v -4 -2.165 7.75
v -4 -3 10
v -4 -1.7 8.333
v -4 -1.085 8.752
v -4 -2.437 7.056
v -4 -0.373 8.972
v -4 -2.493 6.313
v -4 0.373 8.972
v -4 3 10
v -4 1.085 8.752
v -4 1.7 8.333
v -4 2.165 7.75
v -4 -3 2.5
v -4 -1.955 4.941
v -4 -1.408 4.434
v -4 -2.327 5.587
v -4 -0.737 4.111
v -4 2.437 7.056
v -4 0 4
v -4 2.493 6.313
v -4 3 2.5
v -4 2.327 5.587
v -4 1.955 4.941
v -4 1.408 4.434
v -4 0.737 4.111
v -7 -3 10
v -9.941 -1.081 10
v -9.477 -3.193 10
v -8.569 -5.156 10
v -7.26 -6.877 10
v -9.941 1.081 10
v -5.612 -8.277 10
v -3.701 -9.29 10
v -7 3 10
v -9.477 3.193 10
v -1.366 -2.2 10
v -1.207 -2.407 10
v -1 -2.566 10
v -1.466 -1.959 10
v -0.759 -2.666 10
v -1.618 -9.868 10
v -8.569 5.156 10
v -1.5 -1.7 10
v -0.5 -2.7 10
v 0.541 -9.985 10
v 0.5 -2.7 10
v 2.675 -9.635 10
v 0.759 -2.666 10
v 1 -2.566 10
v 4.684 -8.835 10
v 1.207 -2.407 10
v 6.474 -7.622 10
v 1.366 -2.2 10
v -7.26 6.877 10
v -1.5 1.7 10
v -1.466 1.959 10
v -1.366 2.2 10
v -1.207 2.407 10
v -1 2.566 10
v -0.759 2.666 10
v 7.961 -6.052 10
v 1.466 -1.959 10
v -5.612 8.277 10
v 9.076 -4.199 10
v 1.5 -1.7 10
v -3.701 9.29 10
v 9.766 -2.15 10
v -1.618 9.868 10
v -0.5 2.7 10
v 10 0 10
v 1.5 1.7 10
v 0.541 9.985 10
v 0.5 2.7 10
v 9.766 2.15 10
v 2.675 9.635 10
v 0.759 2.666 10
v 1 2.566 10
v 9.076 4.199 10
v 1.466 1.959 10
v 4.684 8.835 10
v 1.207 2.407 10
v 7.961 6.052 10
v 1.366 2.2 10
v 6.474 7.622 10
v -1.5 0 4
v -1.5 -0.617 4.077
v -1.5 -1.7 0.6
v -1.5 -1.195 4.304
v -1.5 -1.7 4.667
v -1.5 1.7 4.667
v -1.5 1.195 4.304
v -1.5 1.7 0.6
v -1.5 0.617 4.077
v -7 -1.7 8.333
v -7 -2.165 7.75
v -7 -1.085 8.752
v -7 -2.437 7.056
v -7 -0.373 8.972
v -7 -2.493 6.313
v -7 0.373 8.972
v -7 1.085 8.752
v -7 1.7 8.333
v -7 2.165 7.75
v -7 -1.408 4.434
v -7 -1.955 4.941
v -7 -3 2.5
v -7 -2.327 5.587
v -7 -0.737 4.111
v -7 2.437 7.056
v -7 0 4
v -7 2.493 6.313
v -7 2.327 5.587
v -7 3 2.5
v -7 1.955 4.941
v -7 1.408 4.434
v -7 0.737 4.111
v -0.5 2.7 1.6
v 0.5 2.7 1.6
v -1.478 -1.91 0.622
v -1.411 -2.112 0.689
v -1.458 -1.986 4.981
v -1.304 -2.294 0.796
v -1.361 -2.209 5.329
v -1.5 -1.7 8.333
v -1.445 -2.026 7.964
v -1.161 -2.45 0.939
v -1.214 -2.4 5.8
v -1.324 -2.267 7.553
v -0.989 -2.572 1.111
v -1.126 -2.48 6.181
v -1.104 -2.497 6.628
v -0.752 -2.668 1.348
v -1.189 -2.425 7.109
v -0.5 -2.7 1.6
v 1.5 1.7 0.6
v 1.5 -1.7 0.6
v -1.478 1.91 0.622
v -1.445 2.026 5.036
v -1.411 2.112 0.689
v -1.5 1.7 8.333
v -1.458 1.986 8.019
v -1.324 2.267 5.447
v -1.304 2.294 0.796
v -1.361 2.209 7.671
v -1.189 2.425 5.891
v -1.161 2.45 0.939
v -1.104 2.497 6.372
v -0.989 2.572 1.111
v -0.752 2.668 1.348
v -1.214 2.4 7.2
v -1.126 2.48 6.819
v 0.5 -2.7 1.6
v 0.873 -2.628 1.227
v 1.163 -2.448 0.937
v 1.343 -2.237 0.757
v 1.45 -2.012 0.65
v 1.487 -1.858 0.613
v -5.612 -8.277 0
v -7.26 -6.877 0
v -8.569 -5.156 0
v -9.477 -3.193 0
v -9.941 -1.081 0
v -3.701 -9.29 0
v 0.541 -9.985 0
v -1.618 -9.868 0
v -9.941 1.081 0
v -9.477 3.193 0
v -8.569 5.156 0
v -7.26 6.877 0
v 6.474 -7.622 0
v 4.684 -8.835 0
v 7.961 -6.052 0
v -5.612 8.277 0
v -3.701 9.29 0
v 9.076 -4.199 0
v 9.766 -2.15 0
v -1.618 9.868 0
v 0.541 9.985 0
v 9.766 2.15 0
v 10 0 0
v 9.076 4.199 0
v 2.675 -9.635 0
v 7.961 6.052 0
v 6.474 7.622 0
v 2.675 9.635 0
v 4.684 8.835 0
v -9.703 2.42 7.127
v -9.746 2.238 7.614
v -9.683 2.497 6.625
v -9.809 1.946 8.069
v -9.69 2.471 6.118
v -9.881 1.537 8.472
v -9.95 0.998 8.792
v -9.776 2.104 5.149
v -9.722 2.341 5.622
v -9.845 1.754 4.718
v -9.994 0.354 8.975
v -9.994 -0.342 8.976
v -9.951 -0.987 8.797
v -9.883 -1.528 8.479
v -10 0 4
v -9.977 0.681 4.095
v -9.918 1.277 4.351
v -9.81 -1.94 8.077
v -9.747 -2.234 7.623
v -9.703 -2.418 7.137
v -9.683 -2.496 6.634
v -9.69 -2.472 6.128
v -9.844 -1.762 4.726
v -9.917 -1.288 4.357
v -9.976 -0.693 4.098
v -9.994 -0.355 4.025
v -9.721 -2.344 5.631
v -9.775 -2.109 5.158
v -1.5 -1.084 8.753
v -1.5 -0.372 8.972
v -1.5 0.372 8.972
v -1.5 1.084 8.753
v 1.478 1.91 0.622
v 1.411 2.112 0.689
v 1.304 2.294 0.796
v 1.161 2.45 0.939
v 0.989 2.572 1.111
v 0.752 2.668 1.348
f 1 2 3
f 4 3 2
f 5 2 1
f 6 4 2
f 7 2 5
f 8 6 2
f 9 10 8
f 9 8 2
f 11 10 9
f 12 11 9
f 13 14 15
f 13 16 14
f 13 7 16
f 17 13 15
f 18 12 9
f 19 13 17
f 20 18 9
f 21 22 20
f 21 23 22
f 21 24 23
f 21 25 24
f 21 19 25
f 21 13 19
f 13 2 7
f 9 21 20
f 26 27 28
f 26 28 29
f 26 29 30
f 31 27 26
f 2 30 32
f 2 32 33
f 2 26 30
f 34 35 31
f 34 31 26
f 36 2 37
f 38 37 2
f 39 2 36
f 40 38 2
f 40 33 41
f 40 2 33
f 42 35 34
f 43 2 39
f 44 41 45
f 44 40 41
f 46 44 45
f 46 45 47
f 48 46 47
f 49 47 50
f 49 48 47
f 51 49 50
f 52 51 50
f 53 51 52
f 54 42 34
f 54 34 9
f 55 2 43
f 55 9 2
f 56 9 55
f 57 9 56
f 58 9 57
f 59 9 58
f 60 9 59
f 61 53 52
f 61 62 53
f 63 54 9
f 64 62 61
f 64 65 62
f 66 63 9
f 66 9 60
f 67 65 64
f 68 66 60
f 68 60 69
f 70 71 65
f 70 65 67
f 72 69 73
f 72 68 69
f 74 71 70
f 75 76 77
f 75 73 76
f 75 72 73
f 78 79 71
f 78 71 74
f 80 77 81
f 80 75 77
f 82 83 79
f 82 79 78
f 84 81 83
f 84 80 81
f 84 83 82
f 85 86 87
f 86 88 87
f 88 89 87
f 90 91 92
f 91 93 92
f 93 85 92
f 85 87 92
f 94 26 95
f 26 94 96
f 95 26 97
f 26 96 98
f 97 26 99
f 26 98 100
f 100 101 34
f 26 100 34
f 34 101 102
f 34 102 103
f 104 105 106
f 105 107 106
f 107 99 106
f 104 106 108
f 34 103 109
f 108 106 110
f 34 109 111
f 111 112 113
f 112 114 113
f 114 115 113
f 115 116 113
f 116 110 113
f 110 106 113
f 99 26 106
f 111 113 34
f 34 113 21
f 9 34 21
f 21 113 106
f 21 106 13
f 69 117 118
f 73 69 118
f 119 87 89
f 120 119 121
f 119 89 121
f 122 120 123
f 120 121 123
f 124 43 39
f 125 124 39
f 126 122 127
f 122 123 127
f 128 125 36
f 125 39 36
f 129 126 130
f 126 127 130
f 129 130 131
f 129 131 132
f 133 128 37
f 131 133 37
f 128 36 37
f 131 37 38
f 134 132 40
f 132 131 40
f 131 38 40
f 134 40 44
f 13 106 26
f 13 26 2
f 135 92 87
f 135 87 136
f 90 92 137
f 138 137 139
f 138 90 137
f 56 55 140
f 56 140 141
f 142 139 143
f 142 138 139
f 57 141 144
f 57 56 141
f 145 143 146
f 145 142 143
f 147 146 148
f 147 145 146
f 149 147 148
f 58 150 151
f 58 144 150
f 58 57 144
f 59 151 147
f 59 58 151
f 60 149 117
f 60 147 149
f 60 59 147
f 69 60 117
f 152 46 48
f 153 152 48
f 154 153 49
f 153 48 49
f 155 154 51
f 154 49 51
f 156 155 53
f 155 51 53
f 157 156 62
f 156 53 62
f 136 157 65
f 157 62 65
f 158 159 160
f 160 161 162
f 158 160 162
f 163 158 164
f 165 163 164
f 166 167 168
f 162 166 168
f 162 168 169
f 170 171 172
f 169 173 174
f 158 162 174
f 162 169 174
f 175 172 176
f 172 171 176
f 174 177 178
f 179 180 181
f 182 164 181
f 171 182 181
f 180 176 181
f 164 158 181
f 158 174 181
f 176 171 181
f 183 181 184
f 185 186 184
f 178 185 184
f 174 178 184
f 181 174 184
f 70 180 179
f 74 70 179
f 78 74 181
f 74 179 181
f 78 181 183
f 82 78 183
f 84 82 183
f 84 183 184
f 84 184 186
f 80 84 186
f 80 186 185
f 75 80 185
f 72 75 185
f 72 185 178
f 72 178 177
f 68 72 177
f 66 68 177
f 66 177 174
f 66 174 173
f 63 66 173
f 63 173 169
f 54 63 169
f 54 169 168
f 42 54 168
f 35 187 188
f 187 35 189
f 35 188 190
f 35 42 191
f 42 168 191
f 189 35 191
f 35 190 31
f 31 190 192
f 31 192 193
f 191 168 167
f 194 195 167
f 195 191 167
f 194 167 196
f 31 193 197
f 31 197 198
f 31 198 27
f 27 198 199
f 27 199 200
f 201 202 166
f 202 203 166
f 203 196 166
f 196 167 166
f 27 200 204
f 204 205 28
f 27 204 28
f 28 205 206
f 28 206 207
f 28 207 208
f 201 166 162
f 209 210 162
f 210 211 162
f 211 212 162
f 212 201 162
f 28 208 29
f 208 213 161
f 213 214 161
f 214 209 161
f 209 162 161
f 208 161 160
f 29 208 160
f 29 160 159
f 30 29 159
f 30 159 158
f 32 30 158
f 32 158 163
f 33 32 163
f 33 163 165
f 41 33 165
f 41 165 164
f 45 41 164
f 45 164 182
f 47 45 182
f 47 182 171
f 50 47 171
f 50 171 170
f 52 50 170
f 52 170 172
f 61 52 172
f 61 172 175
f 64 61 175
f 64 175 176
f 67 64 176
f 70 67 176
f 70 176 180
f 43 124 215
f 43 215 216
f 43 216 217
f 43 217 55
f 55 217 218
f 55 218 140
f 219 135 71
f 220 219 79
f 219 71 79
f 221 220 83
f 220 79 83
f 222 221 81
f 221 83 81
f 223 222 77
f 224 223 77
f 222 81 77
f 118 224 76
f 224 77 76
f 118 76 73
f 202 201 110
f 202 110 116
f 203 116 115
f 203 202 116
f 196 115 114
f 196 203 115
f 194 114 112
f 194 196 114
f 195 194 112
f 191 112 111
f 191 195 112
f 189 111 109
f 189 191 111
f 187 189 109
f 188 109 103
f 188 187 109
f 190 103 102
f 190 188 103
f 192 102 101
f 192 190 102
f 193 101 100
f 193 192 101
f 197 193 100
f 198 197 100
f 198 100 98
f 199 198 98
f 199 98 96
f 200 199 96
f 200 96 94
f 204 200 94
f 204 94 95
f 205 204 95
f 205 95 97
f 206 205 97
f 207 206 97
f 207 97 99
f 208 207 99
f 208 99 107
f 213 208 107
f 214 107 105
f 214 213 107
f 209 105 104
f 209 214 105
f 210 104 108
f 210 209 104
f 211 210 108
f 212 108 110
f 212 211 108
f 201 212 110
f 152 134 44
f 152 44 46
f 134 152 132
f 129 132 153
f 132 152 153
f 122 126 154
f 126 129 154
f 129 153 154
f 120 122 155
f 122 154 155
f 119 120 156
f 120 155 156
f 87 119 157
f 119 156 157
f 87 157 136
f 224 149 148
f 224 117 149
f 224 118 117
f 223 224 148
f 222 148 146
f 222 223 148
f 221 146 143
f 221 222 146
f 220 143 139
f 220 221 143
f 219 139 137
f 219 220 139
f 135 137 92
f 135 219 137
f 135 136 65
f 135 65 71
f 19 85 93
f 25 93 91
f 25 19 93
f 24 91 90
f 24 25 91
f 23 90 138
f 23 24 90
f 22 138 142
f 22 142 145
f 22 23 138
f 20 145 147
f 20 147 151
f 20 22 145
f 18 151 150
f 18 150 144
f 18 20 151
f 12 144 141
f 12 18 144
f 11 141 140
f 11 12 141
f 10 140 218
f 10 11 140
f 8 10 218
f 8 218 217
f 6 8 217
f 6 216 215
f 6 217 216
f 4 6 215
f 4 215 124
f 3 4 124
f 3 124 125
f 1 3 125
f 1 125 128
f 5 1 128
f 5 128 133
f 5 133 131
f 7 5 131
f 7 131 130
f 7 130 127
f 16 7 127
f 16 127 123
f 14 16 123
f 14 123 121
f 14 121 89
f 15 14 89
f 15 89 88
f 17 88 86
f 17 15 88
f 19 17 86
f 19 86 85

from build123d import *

# Parameters (mm, degrees)
CYLINDER001_R     = 2.5
CYLINDER001_DEPTH = 15
BOX_W             = 3
BOX_H             = 5.4
BOX_DEPTH         = 15
FILLET_R          = 1
BOX001_W          = 3
BOX001_H          = 6
BOX001_DEPTH      = 15
CYLINDER_R        = 10
CYLINDER_DEPTH    = 10


with BuildPart() as cilindro001:
    # Cylinder001 → Cylinder001 (new body)
    with BuildSketch(Plane(origin=(-15, 0, 6.5), x_dir=(0, 0, -1), z_dir=(1, 0, 0))):
        Circle(CYLINDER001_R)
    extrude(amount=CYLINDER001_DEPTH)


with BuildPart() as fillet_body:
    # Box → Box (new body)
    with BuildSketch(Plane(origin=(-1.5, -2.7, 0.6), x_dir=(1, 0, 0), z_dir=(0, 0, 1))):
        with Locations((1.5, 2.7)):
            Rectangle(BOX_W, BOX_H)
    extrude(amount=BOX_DEPTH)

    # Fillet
    fillet_edges = [fillet_body.edges().sort_by_distance(p)[0] for p in [
        (-1.5, -2.7, 8.1),
        (-1.5, 2.7, 8.1),
        (1.5, -2.7, 8.1),
        (1.5, 2.7, 8.1),
        (0, -2.7, 0.6),
        (0, -2.7, 15.6),
        (0, 2.7, 0.6),
        (0, 2.7, 15.6),
    ]]
    fillet(fillet_edges, radius=FILLET_R)


with BuildPart() as cubo001:
    # Box001 → Box001 (new body)
    with BuildSketch(Plane(origin=(-7, -3, 2.5), x_dir=(1, 0, 0), z_dir=(0, 0, 1))):
        with Locations((1.5, 3)):
            Rectangle(BOX001_W, BOX001_H)
    extrude(amount=BOX001_DEPTH)


with BuildPart() as cut002:
    # Cylinder → Cylinder (new body)
    with BuildSketch(Plane.XY):
        Circle(CYLINDER_R)
    extrude(amount=CYLINDER_DEPTH)

    # Cut: cut Cubo001
    add(cubo001.part, mode=Mode.SUBTRACT)

    # Cut001: cut Fillet body
    add(fillet_body.part, mode=Mode.SUBTRACT)

    # Cut002: cut Cilindro001
    add(cilindro001.part, mode=Mode.SUBTRACT)


solid = cut002.part
